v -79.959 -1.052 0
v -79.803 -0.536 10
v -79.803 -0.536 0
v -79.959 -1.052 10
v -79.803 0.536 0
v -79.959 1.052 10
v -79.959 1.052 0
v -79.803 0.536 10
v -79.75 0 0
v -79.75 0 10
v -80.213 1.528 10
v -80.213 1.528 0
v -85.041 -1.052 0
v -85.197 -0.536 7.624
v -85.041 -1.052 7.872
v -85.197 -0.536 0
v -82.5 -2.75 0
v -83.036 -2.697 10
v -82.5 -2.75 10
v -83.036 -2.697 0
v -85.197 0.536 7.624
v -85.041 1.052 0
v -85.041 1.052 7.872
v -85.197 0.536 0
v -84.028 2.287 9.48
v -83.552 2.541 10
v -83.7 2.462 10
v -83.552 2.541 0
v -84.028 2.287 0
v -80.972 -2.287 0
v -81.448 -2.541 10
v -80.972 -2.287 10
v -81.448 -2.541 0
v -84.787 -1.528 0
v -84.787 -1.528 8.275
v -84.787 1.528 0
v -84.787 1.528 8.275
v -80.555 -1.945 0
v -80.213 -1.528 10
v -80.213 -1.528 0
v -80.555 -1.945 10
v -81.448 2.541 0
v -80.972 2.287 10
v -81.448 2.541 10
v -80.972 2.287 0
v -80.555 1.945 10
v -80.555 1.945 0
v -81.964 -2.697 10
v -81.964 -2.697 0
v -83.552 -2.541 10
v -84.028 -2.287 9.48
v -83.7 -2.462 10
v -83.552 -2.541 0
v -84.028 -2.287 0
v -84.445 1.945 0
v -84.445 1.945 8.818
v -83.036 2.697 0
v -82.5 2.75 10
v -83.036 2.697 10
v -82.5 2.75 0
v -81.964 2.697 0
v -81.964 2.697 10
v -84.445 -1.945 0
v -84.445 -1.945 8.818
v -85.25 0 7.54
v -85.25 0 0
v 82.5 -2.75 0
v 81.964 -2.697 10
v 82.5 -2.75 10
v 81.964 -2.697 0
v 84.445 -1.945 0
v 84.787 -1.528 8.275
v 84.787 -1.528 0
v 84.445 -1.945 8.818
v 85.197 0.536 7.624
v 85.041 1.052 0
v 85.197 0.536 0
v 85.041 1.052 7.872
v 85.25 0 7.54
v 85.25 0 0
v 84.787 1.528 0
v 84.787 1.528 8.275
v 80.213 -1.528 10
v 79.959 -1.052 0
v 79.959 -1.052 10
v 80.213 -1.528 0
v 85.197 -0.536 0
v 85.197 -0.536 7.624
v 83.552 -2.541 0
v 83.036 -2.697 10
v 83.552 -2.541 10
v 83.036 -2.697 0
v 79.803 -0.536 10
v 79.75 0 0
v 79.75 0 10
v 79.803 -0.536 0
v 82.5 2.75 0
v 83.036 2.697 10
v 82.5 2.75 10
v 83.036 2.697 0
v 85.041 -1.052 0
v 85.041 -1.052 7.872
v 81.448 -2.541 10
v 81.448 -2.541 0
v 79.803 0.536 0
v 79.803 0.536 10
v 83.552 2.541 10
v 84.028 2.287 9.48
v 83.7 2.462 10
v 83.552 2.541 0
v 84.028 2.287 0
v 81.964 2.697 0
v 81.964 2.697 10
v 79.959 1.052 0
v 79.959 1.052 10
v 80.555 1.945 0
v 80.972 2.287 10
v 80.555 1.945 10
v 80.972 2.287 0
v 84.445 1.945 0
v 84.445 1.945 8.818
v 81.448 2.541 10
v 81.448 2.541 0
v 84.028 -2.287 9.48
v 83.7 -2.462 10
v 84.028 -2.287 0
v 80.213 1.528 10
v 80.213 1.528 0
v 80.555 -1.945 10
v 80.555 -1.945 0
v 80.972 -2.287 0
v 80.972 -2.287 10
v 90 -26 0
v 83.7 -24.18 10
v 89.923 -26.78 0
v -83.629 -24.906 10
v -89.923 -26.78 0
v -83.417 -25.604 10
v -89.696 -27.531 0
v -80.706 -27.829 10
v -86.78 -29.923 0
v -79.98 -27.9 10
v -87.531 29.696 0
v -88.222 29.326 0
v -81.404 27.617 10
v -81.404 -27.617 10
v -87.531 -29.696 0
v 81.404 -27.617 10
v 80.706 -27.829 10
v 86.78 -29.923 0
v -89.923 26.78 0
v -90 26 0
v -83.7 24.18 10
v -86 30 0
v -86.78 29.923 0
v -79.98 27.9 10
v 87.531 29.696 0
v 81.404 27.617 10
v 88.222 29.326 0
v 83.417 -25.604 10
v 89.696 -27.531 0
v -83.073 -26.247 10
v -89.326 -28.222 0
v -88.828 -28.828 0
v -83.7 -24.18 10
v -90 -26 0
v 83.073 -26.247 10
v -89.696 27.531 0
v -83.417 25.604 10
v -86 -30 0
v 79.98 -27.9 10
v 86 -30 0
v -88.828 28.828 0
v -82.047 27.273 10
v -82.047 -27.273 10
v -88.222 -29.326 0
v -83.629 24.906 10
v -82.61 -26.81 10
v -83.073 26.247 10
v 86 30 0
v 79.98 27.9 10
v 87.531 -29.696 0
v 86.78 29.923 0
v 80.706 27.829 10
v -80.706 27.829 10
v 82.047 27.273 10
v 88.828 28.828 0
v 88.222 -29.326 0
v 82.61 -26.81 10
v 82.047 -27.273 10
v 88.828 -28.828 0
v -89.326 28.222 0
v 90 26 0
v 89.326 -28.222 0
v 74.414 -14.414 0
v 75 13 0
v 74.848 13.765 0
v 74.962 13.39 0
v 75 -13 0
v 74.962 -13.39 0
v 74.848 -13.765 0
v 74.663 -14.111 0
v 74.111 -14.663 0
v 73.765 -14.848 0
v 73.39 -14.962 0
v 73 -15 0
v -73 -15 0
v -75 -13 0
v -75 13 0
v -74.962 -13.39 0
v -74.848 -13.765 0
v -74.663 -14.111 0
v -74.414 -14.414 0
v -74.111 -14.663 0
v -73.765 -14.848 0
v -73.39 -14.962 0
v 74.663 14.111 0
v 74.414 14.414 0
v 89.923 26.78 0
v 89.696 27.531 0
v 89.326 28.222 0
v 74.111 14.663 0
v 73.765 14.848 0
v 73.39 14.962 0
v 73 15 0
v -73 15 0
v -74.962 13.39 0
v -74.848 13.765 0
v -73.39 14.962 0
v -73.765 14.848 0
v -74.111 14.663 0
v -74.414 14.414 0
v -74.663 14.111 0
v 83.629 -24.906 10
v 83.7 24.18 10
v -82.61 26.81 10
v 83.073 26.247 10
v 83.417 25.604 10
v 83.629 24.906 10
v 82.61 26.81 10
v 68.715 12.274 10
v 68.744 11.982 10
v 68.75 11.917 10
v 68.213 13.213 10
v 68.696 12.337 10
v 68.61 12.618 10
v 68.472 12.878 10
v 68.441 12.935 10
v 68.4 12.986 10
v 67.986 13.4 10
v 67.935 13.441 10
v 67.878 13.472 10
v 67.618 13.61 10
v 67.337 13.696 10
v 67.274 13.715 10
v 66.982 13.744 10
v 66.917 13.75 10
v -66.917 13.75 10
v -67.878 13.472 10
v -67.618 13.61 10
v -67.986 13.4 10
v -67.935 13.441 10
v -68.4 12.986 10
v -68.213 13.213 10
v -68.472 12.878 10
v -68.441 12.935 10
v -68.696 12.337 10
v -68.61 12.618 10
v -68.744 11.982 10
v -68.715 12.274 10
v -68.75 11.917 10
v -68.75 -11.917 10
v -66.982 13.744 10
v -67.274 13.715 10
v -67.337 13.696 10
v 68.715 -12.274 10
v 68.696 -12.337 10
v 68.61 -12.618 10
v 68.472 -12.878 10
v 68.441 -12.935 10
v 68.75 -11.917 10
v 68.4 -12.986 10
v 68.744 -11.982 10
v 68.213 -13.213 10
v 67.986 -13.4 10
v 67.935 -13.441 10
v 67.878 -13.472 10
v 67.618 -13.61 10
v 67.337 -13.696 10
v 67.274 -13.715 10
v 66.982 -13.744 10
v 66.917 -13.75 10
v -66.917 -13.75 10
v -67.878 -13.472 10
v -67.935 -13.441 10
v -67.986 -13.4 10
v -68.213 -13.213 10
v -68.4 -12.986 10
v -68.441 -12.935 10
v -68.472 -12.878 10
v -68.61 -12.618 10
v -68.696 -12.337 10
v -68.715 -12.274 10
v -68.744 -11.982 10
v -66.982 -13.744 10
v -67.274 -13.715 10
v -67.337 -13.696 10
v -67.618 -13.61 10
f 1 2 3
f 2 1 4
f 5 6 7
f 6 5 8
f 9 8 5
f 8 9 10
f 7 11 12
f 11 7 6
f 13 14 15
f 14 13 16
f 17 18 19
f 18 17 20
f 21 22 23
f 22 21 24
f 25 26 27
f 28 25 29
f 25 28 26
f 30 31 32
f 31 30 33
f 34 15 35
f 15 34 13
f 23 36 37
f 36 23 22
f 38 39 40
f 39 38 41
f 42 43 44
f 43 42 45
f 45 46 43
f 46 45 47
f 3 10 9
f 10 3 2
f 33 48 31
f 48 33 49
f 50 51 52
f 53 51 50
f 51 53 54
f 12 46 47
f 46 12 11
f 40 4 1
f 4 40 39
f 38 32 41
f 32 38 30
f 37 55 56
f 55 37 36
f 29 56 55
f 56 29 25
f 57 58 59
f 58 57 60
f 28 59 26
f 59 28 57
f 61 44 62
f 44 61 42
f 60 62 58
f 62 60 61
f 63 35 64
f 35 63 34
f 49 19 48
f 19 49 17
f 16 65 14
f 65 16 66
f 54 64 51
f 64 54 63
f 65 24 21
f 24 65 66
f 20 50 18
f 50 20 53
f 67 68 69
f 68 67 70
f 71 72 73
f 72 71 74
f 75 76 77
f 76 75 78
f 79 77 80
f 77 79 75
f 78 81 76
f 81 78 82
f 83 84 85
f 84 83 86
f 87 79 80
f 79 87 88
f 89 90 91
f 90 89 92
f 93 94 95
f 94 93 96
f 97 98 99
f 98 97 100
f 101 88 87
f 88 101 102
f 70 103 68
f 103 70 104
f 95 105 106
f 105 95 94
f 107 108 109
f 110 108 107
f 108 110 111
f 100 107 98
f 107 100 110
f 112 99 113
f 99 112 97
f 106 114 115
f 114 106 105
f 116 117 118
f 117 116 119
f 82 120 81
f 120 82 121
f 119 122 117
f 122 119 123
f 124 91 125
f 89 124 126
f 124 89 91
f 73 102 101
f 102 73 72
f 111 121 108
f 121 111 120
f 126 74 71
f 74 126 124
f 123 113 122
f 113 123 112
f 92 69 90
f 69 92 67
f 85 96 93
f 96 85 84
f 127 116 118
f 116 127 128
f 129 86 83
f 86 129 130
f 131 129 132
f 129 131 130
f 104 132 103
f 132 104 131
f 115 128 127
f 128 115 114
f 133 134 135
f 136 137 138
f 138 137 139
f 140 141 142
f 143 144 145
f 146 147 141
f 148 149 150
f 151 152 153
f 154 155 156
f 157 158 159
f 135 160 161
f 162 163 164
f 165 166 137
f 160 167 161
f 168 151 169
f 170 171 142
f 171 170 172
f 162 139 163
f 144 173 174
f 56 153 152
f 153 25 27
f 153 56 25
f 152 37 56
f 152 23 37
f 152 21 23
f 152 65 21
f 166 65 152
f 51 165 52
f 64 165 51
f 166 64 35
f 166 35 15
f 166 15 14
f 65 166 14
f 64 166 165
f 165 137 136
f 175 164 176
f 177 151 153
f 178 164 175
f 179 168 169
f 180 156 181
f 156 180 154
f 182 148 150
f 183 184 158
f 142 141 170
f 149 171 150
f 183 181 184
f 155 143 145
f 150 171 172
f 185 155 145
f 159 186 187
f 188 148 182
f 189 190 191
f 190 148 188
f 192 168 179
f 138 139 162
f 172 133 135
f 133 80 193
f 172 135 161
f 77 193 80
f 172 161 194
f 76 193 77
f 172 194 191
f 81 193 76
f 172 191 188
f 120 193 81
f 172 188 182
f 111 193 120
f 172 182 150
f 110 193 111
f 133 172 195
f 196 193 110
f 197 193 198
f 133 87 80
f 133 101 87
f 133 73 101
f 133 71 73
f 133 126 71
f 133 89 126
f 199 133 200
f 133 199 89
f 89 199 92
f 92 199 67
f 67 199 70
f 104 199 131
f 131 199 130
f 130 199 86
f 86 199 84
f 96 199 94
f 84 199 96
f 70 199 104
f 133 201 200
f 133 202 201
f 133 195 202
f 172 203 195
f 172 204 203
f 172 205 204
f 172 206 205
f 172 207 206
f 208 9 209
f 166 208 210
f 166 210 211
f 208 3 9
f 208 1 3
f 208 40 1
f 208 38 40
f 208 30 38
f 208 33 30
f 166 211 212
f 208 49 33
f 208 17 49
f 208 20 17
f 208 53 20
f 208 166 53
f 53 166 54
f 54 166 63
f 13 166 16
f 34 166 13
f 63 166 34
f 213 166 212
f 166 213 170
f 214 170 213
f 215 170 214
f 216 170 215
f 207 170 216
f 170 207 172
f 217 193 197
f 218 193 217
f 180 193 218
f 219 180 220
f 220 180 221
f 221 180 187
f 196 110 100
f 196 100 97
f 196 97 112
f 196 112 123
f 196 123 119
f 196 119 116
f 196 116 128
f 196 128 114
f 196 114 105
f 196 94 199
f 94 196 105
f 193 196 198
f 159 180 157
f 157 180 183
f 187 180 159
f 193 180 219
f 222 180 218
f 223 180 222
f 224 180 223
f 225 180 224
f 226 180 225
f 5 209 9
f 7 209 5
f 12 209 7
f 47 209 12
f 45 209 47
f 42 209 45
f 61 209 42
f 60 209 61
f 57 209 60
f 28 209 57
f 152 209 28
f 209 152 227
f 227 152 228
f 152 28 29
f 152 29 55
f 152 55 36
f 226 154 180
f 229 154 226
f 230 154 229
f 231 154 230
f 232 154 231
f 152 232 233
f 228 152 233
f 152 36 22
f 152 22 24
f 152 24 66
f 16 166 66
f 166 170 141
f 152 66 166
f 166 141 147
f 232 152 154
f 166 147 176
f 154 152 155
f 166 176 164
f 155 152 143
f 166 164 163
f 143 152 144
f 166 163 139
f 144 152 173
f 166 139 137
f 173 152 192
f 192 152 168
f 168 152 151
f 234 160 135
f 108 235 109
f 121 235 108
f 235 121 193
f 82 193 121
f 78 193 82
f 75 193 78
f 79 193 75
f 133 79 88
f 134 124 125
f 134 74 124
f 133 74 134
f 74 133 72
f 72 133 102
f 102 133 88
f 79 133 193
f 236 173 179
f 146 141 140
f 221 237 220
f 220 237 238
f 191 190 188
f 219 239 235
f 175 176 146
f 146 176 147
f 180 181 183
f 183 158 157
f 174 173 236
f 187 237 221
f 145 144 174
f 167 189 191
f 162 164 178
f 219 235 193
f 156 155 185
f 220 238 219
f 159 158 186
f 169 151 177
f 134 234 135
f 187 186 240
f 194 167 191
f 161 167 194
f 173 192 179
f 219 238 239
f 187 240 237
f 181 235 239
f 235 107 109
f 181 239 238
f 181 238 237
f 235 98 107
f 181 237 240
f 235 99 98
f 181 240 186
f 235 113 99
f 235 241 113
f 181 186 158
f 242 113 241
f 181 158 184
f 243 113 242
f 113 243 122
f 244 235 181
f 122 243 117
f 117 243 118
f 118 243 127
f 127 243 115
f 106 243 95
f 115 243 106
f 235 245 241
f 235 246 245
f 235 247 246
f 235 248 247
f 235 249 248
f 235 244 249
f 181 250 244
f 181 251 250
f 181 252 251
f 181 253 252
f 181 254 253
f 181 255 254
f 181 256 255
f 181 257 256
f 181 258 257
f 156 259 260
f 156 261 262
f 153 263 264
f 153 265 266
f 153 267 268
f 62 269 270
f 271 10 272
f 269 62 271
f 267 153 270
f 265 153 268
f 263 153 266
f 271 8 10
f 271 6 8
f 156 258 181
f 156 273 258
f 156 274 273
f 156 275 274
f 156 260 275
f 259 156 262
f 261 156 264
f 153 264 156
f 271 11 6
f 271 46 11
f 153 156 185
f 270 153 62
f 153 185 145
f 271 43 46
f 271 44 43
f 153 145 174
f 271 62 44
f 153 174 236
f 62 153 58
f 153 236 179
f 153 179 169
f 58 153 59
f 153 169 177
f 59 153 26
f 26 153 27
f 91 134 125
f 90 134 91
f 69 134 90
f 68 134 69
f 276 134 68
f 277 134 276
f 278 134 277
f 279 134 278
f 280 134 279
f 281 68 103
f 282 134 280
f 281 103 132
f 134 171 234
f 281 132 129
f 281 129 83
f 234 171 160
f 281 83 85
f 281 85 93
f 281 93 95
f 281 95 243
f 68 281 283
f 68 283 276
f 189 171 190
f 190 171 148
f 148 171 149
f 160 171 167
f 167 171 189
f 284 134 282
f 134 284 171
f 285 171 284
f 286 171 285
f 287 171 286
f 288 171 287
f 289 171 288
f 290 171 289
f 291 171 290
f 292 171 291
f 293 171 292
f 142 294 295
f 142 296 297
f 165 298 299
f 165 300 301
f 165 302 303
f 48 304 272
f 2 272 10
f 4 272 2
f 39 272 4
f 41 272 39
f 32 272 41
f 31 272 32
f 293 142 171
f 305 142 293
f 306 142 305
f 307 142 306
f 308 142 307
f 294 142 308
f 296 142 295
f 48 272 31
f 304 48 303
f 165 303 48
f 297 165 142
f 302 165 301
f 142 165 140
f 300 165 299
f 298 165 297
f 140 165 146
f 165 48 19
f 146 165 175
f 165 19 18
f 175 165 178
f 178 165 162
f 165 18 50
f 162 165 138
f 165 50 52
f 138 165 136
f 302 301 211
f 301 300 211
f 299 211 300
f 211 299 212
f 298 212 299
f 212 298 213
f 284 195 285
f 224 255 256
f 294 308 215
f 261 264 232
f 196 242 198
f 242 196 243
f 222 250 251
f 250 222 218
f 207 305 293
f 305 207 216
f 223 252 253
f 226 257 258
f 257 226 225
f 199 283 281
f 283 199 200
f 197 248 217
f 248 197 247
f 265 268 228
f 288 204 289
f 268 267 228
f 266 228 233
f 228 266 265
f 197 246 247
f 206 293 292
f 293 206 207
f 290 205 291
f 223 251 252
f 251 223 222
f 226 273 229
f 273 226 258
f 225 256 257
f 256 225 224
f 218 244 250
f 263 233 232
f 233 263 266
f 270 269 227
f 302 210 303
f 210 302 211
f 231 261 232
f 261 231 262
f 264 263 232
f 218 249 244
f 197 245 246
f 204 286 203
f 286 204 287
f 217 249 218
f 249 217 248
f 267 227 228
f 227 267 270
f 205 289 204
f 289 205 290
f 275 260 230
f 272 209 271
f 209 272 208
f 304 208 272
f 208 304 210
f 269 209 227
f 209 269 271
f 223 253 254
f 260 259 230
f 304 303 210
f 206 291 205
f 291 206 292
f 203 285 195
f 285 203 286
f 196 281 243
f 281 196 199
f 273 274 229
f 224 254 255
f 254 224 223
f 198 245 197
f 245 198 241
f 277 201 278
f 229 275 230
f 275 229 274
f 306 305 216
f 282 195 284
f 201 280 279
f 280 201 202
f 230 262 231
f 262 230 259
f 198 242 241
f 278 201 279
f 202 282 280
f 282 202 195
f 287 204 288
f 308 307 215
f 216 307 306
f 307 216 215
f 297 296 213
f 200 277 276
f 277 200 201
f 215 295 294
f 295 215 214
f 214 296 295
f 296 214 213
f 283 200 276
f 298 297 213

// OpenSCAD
$fn = 32;

// ----------------------------------------------------------------------
// Display bezel: 180 x 60 mm frame, opening 150x30 mm
// ----------------------------------------------------------------------

// --- parameters (mm) ---
length = 180;             // frame outside length, X
width = 60;               // frame outside width, Y
frame_w = 15;             // frame width
thickness = 10;           // frame thickness
corner_r = 4;             // outside corner radius
chamfer = 0.93;           // outer wall taper
funnel = 0.9;             // inner opening taper
opening_l = 150;          // opening length
opening_w = 30;           // opening width
inner_r = 2;              // opening corner radius
hole_d = 5.5;             // mounting screw clearance
holes_per_side = 1;       // holes per short side
hole_inset = 7.5;         // hole centre inset from the outside edge

/* rounded-rectangle outlines, generated with loops */
module rounded_ring(l_nom, w_nom, r) {
  hull() {
    for (sx = [-1, 1]) for (sy = [-1, 1])
      translate([sx * (l_nom / 2 - r), sy * (w_nom / 2 - r)]) circle(r = r);
  }
}

difference() {
  /* frame body, drafted so the outer edge is a variable-depth chamfer */
  linear_extrude(height = thickness, scale = chamfer)
    rounded_ring(length, width, corner_r);
  /* viewing opening, drafted the other way for a funnel edge */
  linear_extrude(height = thickness + 2, scale = funnel)
    translate([0, 0, -1]) rounded_ring(opening_l, opening_w, inner_r);
  /* mounting screws through the frame lands */
  for (sx = [-1, 1]) for (i = [1 : holes_per_side])
    translate([sx * (length / 2 - hole_inset),
               (i - (holes_per_side + 1) / 2) * width * 0.5, -1])
      cylinder(h = thickness + 2, d = hole_d);
}
